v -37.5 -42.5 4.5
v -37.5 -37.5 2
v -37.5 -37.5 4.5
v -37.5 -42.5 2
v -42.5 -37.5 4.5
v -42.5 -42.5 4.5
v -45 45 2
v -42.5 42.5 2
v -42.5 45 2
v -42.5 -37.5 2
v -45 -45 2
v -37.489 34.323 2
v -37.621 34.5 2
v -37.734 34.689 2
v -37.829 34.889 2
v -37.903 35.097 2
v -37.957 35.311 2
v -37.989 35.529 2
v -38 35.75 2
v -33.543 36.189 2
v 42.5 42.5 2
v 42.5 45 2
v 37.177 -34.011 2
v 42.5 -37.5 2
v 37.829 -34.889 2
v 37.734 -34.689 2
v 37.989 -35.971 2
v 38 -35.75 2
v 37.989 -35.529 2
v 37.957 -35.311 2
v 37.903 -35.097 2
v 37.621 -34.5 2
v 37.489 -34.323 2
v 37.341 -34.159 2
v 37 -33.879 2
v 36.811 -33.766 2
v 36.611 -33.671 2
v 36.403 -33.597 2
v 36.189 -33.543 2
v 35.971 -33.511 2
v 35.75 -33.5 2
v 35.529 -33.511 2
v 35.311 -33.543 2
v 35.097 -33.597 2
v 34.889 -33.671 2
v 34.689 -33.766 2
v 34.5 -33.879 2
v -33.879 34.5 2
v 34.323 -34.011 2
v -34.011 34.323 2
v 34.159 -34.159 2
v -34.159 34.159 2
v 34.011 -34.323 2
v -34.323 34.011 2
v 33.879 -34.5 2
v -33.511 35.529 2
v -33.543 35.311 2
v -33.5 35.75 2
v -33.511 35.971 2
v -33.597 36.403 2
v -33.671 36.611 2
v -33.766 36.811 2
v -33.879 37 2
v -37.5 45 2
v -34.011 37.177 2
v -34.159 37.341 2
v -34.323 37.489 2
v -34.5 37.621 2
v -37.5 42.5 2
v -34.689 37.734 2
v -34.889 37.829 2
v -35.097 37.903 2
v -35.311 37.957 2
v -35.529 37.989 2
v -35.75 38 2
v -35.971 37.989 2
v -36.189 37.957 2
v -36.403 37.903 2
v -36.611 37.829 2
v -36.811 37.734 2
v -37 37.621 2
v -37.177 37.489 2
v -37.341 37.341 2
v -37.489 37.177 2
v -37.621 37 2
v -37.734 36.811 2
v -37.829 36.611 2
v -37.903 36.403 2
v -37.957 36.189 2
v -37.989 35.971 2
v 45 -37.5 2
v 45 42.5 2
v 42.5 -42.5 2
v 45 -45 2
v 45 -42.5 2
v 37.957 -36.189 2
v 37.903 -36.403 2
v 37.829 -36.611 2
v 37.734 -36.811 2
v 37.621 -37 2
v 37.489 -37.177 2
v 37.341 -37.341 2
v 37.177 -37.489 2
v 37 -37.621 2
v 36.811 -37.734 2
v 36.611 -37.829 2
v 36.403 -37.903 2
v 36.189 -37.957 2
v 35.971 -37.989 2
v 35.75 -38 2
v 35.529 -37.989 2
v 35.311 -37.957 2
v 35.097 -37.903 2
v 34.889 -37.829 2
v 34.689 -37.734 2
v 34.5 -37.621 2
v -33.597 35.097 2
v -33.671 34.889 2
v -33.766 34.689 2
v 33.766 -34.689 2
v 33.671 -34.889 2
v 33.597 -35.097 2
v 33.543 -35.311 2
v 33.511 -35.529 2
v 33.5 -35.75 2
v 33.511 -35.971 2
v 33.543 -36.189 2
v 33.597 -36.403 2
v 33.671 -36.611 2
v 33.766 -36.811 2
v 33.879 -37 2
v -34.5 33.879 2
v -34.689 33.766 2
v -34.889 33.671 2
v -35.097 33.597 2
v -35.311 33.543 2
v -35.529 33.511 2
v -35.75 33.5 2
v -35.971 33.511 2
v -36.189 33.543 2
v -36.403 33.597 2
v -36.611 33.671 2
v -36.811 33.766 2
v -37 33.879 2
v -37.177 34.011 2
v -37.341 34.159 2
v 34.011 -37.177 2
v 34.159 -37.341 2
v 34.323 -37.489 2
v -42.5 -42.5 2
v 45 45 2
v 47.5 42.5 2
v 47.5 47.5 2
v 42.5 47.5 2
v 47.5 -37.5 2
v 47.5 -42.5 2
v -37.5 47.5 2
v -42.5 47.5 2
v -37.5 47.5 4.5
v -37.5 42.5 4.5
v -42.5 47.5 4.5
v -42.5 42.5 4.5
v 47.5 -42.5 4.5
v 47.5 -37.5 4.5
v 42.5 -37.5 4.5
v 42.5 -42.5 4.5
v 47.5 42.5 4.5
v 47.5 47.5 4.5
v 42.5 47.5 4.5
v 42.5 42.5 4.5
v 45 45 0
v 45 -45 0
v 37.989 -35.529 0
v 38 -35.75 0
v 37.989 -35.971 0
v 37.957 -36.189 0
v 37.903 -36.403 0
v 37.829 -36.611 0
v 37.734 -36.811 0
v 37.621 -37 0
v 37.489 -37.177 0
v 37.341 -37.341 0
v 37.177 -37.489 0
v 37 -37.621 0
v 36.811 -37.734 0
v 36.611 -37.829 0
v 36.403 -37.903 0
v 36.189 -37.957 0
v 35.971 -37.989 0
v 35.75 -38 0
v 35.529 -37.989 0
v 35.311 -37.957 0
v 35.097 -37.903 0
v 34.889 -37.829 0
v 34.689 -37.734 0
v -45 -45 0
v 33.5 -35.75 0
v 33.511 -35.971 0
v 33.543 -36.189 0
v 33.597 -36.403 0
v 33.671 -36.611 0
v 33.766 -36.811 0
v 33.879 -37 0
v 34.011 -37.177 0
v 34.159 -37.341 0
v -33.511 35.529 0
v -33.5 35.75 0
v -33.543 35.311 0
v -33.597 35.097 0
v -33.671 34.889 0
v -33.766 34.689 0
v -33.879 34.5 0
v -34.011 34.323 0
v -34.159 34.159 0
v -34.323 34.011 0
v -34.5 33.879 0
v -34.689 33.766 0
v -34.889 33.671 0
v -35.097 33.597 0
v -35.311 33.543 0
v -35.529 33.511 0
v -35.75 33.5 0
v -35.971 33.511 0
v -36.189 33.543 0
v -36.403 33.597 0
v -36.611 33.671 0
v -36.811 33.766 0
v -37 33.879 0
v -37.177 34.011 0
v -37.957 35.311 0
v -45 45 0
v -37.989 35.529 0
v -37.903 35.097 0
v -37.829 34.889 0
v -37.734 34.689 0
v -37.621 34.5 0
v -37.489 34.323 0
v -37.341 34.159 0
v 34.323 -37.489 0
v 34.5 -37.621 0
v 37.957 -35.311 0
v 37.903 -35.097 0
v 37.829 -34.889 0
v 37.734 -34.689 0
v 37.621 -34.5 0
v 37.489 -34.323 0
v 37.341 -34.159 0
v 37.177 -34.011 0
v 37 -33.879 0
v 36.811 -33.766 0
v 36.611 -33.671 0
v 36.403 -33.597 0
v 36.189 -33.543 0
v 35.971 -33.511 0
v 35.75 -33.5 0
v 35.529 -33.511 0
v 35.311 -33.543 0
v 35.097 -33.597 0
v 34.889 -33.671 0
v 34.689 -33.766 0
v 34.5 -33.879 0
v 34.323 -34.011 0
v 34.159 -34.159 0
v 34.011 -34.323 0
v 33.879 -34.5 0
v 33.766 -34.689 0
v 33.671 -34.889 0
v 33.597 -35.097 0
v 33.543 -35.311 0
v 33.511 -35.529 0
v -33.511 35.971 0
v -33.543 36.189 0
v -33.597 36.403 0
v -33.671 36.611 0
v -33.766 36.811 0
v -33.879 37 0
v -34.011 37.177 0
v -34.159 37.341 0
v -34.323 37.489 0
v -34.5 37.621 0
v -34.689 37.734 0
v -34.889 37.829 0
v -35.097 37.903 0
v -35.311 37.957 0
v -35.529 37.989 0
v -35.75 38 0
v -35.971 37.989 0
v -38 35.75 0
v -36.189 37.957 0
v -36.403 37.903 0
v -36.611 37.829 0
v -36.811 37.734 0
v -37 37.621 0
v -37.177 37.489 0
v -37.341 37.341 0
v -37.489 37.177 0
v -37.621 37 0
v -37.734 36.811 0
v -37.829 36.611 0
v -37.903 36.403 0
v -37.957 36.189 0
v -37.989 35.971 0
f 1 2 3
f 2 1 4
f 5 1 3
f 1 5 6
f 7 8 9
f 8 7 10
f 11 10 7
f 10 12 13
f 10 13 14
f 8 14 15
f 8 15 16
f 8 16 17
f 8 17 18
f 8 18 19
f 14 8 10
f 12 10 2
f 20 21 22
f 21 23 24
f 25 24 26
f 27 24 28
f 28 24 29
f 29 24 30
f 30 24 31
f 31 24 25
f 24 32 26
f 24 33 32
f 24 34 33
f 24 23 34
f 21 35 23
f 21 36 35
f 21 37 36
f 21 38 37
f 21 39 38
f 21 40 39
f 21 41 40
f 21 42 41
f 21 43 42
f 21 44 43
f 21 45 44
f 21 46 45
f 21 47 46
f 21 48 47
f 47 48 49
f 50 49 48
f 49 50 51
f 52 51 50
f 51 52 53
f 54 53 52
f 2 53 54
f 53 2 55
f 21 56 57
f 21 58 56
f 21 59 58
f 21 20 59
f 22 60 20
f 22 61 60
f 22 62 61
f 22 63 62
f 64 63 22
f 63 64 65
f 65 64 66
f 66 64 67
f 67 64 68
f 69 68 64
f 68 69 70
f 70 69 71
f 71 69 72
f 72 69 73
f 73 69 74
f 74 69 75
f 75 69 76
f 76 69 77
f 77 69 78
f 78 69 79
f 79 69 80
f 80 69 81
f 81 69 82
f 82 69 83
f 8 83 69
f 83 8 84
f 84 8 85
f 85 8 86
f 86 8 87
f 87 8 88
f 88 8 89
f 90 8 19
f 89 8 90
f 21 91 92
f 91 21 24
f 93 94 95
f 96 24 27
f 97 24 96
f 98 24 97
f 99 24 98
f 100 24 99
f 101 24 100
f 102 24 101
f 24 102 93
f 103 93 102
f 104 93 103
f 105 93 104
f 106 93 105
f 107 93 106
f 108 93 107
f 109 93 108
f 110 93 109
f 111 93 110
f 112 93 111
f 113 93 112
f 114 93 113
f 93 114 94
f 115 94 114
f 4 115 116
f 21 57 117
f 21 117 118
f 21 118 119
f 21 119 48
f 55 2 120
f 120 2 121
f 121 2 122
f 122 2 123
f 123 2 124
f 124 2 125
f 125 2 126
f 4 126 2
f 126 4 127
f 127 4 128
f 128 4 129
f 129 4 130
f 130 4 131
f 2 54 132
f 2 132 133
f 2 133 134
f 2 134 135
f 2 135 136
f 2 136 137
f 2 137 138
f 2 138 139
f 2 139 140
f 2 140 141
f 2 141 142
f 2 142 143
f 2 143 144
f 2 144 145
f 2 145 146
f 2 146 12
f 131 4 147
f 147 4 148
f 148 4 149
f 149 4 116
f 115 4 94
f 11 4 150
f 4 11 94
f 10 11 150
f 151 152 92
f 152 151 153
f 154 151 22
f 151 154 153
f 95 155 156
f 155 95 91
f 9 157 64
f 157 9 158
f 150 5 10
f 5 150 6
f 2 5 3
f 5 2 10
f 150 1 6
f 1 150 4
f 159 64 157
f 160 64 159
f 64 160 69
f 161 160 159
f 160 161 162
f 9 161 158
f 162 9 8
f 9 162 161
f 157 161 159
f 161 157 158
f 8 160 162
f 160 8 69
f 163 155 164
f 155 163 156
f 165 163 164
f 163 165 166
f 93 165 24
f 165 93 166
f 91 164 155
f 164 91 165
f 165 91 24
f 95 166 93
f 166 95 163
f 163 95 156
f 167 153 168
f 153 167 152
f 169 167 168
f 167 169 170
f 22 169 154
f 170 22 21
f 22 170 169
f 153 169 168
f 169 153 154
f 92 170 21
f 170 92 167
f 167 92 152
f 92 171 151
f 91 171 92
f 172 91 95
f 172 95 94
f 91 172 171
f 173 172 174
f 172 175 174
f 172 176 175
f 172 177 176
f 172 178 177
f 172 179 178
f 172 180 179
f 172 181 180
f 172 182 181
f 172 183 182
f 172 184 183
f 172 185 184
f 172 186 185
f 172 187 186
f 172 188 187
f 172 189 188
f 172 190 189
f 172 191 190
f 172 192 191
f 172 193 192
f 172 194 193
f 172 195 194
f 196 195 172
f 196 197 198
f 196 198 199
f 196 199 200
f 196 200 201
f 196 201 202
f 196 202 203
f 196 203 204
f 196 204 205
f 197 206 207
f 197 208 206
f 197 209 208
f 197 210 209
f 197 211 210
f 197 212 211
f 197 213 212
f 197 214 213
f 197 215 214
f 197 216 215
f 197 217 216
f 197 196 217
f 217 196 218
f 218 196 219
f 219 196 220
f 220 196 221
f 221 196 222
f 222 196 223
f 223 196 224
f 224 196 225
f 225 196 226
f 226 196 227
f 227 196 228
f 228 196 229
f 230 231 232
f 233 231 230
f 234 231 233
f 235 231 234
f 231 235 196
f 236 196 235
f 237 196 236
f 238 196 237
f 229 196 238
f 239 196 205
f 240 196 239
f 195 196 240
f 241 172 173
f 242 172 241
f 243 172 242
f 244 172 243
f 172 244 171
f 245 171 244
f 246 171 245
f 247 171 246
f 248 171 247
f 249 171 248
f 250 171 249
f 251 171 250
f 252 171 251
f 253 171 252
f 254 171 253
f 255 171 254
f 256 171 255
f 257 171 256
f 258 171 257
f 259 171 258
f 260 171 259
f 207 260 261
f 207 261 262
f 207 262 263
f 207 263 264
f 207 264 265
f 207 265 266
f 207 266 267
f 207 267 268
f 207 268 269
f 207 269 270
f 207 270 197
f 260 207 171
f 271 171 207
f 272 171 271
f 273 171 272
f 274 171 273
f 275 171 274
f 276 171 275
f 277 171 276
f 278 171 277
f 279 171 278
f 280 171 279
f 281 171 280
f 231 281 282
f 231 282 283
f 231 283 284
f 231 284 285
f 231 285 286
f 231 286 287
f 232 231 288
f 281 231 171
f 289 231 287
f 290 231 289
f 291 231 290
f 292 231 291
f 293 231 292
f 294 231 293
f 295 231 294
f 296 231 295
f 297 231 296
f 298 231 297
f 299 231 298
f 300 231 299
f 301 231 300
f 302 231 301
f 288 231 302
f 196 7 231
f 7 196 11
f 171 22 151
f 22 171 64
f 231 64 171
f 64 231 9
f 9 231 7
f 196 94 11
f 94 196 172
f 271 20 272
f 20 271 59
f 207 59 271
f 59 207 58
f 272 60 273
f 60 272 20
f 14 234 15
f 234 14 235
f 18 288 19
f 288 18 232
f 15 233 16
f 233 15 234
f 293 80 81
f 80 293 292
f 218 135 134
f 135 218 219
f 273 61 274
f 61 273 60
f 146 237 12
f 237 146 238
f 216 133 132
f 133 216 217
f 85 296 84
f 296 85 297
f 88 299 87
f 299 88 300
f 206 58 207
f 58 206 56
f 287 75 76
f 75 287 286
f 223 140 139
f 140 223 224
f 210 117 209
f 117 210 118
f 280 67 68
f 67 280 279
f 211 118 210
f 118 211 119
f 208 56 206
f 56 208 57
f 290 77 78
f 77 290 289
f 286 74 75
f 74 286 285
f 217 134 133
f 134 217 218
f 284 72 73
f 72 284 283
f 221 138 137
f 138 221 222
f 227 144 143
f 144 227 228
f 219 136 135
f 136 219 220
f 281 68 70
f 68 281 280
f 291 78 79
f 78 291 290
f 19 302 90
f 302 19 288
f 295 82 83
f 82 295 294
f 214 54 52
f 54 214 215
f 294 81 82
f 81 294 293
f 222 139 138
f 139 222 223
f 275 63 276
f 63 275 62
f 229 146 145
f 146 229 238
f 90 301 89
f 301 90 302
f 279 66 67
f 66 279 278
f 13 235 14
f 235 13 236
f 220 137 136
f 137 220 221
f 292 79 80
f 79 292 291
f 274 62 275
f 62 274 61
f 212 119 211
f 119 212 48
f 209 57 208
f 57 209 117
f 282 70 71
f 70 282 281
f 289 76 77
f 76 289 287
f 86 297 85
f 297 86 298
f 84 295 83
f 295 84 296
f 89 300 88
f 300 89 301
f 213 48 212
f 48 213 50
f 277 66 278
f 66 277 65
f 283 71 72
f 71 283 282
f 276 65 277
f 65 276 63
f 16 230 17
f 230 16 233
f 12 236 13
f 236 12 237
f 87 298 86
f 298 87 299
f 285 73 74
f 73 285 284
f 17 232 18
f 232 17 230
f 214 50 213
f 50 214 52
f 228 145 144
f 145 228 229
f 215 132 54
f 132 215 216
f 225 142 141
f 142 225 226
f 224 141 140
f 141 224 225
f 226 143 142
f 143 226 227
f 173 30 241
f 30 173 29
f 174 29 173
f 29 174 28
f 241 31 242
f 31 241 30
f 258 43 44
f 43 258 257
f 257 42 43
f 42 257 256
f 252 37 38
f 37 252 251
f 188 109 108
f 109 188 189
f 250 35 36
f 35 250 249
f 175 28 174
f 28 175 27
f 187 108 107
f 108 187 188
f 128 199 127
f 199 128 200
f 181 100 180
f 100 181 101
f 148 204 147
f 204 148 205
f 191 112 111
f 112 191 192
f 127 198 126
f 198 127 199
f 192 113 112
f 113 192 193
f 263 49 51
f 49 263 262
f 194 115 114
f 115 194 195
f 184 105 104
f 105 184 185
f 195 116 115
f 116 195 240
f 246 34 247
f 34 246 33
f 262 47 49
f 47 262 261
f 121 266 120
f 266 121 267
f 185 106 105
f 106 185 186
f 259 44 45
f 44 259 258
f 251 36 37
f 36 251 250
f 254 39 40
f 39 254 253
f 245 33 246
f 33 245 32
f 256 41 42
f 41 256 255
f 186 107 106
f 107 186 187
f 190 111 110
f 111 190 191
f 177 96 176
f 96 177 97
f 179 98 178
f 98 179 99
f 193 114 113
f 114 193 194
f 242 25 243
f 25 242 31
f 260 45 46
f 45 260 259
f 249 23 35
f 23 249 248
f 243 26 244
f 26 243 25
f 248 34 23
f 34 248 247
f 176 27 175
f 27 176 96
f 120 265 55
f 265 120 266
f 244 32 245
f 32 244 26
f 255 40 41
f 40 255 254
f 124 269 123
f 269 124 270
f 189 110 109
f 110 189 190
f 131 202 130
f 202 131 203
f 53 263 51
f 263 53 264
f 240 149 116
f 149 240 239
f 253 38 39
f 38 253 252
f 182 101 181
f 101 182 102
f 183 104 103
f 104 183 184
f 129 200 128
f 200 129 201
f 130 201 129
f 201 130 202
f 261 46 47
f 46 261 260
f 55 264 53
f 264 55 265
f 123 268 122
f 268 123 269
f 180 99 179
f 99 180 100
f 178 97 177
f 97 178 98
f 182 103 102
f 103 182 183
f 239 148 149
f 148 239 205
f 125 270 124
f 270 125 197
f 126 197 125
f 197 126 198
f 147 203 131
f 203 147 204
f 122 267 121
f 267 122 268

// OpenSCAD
// DIY magnetic stirrer housing (print orientation: top plate down, box open upward)
// Units: mm

$fn = 64;

// ---- Dimensions ----
plate_t      = 2;     // top plate thickness (z = 0 to 2)
wall_t       = 2.5;   // wall thickness (z = 2 to 40)
box_h        = 40;    // overall height
outer_x      = 90;    // outer size in X
outer_y      = 90;    // outer size in Y
screw_d      = 4.5;   // M4 screw hole diameter
screw_pitch  = 71.5;  // square pattern diagonal between screw holes
notch_w      = 12;    // cable notch width
notch_depth  = 8;     // notch depth from open edge (z = 32 to 40)

// ---- Derived ----
inner_x = outer_x - 2 * wall_t;
inner_y = outer_y - 2 * wall_t;
notch_z0 = box_h - notch_depth;   // bottom of notch (z = 32)

// ---- Model ----
difference() {
    union() {
        // Top plate (lies on the bed)
        translate([-outer_x / 2, -outer_y / 2, 0])
            cube([outer_x, outer_y, plate_t]);

        // Four walls rising from the plate
        for (sx = [-1, 1], sy = [-1, 1])
            translate([sx * (outer_x / 2 - wall_t), sy * (outer_y / 2 - wall_t), plate_t])
                cube([2 * wall_t, 2 * wall_t, wall_t]);  // z = 2 to 40
    }

    // Screw holes through the top plate on a 71.5 mm square pattern
    for (i = [0 : 3]) {
        a = atan2([0, outer_x, outer_y, -outer_x][i], [outer_y, 0, -outer_x, outer_x][i]);
        translate([cos(a) * screw_pitch / sqrt(2), sin(a) * screw_pitch / sqrt(2), -1])
            cylinder(d = screw_d, h = plate_t + 2);
    }

    // Cable notch in one wall: 12 mm wide, centred along the wall
    translate([-inner_x / 2 + notch_w / 2, -inner_y / 2 + notch_w / 2, notch_z0])
        cube([notch_w, inner_y - notch_w + 1, notch_depth]);
}
